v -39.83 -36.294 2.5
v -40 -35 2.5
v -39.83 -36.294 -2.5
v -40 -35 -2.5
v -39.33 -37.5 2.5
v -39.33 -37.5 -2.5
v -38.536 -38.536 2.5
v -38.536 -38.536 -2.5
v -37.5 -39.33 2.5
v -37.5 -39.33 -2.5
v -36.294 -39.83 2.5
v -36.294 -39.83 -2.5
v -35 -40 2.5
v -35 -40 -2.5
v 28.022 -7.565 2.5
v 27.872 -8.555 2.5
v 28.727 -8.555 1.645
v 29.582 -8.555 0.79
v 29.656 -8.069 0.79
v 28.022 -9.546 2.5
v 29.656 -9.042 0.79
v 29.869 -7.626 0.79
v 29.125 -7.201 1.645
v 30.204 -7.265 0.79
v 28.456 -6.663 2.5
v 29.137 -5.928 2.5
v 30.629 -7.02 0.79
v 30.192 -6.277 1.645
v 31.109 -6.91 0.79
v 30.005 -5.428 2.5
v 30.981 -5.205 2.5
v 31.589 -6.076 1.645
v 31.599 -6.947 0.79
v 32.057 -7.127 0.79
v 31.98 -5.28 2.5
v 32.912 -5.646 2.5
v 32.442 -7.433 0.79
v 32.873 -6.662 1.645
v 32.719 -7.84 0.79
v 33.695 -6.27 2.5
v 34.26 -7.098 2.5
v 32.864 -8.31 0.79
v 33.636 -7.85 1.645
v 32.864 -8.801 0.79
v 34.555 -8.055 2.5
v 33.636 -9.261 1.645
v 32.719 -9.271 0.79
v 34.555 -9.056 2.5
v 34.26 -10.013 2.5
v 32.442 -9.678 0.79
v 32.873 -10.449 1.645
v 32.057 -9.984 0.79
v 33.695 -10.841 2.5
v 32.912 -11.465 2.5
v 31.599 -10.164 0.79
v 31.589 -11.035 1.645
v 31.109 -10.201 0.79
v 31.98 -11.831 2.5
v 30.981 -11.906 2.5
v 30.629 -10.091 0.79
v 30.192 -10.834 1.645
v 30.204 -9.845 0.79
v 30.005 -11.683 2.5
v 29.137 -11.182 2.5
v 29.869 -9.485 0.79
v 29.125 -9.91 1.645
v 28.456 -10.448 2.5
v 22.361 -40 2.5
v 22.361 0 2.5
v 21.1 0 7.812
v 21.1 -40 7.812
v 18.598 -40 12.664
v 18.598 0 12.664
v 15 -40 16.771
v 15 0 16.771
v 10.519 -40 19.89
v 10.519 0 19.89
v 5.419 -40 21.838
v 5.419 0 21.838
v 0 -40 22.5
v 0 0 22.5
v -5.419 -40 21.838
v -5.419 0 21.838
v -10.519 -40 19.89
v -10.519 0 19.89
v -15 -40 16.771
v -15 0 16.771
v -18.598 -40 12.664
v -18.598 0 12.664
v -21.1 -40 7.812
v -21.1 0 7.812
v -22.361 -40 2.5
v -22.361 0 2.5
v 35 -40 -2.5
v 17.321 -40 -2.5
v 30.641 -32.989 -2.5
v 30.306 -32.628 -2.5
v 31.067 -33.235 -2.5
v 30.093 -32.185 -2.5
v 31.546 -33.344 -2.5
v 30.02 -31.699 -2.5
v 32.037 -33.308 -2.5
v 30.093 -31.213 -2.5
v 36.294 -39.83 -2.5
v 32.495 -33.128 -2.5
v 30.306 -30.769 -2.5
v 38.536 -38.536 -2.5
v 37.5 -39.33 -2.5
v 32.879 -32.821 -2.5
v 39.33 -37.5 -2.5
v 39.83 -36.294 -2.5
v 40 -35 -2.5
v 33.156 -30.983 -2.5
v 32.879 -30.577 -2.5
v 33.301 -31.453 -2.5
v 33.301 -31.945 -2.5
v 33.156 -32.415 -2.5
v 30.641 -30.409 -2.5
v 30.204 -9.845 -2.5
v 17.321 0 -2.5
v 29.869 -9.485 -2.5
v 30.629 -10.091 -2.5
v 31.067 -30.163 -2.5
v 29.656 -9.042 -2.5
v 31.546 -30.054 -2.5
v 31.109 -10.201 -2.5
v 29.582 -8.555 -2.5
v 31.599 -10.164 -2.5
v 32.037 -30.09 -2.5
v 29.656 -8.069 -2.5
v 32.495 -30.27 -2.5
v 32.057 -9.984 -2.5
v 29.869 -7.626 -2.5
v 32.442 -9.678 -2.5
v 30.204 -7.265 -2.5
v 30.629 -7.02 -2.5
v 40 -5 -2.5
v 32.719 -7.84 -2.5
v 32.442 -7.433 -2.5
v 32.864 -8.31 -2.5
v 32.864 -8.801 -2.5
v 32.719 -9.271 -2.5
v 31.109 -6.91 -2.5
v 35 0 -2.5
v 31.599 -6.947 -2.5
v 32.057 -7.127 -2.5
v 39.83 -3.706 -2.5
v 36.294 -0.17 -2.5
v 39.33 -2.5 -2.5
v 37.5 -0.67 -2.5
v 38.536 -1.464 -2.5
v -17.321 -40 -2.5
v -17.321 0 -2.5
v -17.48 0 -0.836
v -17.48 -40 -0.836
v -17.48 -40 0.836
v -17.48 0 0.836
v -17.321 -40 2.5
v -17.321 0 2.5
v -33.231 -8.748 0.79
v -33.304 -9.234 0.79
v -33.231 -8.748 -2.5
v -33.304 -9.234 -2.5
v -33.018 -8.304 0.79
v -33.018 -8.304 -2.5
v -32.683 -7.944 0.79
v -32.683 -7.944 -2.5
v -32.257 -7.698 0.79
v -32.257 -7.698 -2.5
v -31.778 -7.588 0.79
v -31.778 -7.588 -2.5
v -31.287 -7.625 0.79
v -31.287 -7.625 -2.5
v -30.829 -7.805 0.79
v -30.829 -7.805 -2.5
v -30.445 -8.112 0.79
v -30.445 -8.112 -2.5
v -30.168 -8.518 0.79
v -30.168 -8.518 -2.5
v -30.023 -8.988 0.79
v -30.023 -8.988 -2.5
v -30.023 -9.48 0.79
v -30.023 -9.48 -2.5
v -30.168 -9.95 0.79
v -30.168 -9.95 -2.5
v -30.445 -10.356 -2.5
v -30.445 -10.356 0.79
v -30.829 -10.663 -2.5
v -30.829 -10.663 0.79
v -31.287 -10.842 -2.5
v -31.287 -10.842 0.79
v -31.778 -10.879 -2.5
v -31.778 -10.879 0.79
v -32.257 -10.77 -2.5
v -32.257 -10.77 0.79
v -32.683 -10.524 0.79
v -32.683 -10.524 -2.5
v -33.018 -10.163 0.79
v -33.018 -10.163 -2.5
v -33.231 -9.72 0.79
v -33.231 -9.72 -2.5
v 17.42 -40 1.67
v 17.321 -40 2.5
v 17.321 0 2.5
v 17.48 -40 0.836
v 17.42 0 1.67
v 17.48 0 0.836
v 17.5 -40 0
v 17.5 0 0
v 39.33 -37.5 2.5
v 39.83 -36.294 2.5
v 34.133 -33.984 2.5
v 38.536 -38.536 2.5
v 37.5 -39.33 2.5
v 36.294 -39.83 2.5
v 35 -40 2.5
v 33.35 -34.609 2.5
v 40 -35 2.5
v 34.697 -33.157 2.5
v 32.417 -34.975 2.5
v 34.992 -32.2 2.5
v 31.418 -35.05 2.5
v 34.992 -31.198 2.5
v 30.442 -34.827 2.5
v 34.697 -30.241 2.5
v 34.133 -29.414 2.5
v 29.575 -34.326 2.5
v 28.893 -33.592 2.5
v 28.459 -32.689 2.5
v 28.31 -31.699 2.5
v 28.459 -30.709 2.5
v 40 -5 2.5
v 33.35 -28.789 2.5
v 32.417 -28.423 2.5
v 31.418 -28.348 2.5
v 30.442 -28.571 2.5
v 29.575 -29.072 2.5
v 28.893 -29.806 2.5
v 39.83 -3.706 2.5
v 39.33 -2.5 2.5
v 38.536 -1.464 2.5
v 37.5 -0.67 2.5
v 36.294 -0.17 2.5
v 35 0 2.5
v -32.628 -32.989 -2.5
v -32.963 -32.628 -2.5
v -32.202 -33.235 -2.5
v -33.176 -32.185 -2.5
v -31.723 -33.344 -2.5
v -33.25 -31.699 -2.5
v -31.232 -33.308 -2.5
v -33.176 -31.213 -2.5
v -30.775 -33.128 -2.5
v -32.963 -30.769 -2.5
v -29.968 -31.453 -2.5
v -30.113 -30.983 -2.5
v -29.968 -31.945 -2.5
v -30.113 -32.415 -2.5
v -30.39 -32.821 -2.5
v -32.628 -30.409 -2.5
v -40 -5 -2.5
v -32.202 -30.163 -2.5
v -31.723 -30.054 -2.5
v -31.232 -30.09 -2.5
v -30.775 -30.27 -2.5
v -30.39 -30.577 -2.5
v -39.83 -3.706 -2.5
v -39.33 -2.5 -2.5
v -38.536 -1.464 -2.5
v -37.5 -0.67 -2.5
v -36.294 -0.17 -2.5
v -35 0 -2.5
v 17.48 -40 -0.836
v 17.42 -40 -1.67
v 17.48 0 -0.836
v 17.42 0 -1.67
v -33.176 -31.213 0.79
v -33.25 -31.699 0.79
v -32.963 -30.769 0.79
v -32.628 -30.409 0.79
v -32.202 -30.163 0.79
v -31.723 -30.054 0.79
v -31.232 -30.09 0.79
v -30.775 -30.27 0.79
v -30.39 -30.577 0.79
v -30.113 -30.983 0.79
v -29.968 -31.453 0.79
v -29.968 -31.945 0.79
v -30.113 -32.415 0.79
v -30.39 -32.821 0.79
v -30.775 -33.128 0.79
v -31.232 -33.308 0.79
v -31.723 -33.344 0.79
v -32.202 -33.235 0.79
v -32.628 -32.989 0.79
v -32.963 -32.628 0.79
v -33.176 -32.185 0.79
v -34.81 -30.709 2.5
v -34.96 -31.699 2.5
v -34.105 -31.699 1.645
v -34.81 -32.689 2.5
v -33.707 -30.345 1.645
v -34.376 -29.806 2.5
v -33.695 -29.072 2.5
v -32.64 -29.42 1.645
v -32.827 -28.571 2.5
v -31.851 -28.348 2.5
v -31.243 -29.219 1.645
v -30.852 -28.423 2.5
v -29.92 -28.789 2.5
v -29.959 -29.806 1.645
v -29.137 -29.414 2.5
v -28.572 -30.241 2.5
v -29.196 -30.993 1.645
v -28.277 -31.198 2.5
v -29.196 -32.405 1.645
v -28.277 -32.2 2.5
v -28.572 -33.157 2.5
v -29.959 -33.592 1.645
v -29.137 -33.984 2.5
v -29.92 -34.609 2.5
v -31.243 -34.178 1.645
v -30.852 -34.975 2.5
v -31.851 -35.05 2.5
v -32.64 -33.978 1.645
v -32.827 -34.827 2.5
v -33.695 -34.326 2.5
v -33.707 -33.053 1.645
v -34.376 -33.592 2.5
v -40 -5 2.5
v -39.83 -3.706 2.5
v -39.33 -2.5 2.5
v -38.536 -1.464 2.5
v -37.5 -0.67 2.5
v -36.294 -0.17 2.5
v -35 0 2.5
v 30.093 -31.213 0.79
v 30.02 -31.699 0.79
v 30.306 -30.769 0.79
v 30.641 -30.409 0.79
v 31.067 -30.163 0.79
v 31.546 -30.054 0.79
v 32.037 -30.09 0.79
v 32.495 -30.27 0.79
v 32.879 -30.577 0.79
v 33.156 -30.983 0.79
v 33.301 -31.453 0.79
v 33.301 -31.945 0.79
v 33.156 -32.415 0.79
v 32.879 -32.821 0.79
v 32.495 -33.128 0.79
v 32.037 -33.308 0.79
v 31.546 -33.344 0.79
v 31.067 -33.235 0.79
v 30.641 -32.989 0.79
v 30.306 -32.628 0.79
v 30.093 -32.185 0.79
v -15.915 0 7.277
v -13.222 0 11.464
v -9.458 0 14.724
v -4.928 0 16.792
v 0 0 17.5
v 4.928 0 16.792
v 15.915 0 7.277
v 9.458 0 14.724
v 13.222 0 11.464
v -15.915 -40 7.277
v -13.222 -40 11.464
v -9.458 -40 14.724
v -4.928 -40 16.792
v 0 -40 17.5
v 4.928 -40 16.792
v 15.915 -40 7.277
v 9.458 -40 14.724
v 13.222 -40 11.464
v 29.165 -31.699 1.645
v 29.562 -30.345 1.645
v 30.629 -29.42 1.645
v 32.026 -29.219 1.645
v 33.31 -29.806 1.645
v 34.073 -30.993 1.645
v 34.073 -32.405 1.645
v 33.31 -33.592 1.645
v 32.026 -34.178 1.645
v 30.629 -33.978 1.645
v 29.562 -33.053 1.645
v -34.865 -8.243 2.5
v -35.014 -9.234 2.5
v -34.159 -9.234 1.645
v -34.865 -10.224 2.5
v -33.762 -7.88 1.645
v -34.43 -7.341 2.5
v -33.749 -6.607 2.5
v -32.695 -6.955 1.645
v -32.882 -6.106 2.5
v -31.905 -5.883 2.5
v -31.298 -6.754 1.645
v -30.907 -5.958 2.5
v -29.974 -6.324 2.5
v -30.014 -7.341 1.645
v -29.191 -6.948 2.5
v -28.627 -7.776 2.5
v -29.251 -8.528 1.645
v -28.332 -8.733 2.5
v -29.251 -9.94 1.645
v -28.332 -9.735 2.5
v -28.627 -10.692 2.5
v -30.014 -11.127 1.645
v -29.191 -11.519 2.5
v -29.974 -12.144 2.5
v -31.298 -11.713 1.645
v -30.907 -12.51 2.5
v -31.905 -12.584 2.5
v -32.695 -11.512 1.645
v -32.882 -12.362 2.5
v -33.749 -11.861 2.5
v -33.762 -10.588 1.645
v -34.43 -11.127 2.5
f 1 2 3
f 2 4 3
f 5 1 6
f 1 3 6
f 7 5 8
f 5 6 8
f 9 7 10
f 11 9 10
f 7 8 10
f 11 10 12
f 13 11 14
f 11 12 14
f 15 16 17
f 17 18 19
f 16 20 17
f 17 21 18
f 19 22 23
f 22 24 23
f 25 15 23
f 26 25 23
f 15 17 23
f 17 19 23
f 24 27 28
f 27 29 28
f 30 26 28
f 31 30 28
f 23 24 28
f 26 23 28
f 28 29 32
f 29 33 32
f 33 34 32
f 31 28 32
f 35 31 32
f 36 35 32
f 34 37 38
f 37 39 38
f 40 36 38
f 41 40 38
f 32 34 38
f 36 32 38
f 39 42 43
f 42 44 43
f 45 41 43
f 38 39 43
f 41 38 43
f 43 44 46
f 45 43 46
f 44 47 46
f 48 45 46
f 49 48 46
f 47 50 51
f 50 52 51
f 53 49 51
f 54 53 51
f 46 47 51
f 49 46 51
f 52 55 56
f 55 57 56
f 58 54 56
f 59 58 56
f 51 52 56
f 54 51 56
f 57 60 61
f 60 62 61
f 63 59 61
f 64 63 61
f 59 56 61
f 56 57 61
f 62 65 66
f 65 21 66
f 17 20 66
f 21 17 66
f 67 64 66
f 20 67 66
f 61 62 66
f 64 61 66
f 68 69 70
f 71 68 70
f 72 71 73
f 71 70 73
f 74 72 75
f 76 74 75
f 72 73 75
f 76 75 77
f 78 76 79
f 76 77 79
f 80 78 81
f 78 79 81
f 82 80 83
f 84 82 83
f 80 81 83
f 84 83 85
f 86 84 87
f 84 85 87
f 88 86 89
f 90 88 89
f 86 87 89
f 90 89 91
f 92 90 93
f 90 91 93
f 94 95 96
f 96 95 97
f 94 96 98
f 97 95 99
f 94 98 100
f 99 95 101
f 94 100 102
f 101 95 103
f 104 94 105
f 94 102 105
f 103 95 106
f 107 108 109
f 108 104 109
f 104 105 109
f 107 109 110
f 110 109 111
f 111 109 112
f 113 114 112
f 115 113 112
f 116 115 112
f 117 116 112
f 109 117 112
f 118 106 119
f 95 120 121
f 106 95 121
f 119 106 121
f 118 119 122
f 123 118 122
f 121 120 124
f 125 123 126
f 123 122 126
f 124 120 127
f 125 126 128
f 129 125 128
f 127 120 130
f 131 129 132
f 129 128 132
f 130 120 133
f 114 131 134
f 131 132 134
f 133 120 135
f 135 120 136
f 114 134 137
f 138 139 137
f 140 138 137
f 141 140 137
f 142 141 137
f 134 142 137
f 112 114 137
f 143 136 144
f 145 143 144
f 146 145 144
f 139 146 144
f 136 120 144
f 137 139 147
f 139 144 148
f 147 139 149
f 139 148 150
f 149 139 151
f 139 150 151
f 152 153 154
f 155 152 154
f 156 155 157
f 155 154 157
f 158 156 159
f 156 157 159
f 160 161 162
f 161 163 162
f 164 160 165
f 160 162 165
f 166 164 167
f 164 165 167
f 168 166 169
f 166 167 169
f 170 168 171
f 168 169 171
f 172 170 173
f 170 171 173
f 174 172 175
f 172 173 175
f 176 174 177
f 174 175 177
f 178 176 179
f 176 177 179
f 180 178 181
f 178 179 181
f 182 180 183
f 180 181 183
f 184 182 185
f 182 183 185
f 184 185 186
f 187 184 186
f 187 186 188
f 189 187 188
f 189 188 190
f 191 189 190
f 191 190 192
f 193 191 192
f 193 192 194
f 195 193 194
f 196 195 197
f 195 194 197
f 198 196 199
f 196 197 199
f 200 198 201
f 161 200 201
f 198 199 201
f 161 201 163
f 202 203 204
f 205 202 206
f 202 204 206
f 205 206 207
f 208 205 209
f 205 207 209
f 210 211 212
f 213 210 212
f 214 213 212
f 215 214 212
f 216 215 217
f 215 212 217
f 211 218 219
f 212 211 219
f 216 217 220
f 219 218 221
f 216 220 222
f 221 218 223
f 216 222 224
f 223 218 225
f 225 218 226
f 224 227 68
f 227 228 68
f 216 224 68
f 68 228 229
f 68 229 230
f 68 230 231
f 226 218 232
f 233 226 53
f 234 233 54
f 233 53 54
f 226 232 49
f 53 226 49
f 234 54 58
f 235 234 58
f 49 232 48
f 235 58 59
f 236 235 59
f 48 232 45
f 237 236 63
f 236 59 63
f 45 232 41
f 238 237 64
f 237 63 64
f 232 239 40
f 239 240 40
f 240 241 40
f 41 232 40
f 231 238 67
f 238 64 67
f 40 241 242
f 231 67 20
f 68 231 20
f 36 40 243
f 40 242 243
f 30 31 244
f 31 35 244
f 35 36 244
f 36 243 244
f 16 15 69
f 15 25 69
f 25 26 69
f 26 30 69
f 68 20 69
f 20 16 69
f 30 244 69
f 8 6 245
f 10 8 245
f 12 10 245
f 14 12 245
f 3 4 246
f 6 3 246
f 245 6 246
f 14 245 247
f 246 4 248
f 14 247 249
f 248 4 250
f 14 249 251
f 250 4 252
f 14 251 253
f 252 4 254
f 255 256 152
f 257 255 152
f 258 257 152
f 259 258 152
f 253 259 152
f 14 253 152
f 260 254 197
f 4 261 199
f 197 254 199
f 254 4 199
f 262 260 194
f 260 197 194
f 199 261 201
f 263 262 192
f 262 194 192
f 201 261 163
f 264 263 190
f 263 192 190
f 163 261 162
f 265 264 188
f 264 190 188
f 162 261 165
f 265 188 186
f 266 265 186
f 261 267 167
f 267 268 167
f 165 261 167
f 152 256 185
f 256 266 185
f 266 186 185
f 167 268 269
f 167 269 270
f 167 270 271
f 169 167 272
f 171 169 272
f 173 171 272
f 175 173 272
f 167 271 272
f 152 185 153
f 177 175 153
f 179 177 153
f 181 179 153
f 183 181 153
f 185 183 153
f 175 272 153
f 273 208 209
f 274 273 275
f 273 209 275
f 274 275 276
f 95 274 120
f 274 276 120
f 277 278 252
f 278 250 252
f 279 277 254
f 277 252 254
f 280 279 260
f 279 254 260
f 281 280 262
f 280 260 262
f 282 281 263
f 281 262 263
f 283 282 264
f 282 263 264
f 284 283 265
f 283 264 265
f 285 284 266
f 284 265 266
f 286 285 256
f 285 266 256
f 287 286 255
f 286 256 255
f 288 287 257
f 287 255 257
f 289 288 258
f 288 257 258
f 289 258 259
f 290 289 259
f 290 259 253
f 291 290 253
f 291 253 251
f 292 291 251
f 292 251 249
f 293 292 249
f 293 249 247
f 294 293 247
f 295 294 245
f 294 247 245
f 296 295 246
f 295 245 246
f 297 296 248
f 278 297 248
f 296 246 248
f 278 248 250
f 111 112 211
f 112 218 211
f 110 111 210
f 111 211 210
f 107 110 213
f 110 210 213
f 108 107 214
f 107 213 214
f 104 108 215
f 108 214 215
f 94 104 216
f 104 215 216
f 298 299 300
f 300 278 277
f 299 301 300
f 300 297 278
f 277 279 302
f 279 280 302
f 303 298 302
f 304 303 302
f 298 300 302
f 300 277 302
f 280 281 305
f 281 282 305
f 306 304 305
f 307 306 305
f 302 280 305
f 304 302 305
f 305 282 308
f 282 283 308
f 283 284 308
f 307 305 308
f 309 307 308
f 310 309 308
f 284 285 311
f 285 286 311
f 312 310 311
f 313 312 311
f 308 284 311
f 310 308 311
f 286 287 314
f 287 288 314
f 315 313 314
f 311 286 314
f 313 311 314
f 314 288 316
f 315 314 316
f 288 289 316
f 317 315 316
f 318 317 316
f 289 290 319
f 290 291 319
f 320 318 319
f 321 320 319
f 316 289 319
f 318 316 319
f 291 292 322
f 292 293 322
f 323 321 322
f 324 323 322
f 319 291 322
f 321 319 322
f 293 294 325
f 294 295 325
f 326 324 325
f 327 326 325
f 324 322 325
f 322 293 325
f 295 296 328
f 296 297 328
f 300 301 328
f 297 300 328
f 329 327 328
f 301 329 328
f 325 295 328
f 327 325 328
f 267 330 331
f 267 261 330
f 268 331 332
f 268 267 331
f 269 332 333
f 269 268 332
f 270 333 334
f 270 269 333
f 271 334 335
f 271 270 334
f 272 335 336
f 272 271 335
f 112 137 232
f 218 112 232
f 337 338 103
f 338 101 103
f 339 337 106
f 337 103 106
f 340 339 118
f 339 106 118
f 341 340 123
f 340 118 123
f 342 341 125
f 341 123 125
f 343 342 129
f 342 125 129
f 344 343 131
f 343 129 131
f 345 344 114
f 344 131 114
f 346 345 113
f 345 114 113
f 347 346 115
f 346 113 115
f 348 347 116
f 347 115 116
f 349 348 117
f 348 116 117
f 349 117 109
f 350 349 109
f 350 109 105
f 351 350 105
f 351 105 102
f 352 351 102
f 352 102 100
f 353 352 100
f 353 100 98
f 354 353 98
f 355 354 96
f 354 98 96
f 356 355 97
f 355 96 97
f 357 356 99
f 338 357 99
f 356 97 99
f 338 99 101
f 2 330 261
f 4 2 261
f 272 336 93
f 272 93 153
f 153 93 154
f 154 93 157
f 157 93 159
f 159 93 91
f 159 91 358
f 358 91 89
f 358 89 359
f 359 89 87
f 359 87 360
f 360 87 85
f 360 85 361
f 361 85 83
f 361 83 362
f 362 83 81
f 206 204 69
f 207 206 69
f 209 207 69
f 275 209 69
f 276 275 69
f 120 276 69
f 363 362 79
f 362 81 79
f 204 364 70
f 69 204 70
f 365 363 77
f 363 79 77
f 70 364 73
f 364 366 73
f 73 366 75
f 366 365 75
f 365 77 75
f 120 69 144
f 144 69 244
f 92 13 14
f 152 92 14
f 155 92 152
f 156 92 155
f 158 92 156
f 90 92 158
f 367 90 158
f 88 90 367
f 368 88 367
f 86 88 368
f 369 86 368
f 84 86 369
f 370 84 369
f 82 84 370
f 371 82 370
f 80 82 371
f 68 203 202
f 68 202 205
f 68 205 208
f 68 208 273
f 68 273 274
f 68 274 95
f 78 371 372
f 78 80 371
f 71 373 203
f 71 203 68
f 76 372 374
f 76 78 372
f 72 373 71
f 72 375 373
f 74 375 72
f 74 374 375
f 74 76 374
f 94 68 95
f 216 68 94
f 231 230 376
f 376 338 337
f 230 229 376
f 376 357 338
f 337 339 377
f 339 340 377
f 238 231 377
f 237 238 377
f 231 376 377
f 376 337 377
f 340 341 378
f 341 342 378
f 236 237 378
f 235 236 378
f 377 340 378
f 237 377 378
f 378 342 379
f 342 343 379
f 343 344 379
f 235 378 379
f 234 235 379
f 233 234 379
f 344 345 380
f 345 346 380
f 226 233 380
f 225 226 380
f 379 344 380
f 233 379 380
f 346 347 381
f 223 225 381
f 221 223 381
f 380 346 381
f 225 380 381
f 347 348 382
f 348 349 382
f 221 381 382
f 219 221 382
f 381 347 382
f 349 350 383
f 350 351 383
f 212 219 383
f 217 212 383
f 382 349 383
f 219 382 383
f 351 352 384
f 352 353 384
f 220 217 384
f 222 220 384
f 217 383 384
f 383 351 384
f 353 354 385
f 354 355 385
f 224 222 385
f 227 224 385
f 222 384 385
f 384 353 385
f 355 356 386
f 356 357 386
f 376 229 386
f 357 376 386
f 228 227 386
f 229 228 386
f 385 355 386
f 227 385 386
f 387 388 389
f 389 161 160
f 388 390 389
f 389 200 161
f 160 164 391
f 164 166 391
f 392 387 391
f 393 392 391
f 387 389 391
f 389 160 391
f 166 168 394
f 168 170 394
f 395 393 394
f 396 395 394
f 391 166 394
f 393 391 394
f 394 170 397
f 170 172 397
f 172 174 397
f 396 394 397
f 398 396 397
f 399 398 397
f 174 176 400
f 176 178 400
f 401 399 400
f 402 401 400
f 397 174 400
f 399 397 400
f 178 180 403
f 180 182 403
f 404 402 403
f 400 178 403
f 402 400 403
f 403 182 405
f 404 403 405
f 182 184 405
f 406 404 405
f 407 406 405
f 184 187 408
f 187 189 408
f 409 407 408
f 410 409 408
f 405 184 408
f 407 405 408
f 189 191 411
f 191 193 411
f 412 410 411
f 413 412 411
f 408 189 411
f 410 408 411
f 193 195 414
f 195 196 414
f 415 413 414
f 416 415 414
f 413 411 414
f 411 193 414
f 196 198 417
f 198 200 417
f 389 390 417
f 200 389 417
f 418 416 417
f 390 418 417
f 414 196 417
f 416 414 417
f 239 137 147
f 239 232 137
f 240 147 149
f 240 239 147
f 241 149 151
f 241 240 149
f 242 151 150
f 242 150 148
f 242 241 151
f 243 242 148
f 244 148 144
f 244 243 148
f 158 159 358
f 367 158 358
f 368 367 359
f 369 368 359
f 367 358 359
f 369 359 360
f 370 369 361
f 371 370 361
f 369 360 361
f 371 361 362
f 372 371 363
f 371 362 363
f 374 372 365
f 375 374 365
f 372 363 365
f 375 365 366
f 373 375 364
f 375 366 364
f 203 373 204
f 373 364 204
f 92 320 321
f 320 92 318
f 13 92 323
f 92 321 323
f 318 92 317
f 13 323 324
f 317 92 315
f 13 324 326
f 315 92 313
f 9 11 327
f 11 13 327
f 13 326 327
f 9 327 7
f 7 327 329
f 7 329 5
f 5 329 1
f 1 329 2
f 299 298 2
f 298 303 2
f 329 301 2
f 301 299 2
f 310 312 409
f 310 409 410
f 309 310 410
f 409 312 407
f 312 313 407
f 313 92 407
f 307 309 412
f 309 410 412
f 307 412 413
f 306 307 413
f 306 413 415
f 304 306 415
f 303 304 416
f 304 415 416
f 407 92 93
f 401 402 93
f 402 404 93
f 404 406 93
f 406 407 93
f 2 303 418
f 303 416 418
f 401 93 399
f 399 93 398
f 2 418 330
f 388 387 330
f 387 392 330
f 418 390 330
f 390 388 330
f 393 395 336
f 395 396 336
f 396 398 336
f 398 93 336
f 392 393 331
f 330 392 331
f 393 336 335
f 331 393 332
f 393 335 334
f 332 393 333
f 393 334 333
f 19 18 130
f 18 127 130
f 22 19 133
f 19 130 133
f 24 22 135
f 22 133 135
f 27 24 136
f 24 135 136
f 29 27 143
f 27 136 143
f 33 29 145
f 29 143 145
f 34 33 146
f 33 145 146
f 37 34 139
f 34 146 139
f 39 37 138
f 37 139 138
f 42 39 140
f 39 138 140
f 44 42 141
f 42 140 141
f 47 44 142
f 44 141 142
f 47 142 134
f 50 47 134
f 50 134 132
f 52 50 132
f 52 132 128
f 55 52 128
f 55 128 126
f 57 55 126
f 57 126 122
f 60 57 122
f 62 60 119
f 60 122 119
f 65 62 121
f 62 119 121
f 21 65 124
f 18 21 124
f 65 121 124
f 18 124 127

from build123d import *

# Parameters (mm, degrees)
F1_DEPTH       = 40
F2_R           = 5
F4_D           = 3.3
F4_DEPTH       = 13.5
F4_CSINK_D     = 6.72
F4_CSINK_ANGLE = 90
F4_TIP         = 0.9914200214


with BuildPart() as f1:
    # F0 (on Front) → F1 (new body)
    with BuildSketch(Plane.XZ):
        with BuildLine():
            Line((-40, -2.5), (-22.360679775, -2.5))
            ThreePointArc((-22.360679775, -2.5), (-22.5, 0), (-22.360679775, 2.5))
            Line((-22.360679775, 2.5), (-40, 2.5))
            Line((-40, 2.5), (-40, -2.5))
        make_face()
        with BuildLine():
            ThreePointArc((-22.360679775, 2.5), (-22.5, 0), (-22.360679775, -2.5))
            Line((-22.360679775, -2.5), (-17.3205080757, -2.5))
            ThreePointArc((-17.3205080757, -2.5), (-17.5, 0), (-17.3205080757, 2.5))
            Line((-17.3205080757, 2.5), (-22.360679775, 2.5))
        make_face()
        with BuildLine():
            Line((17.3205080757, 2.5), (22.360679775, 2.5))
            ThreePointArc((22.360679775, 2.5), (0, 22.5), (-22.360679775, 2.5))
            Line((-22.360679775, 2.5), (-17.3205080757, 2.5))
            ThreePointArc((-17.3205080757, 2.5), (0, 17.5), (17.3205080757, 2.5))
        make_face()
        with BuildLine():
            Line((17.3205080757, -2.5), (22.360679775, -2.5))
            ThreePointArc((22.360679775, -2.5), (22.4651429434, -1.2519395078), (22.5, 0))
            ThreePointArc((22.5, 0), (22.4651429434, 1.2519395078), (22.360679775, 2.5))
            Line((22.360679775, 2.5), (17.3205080757, 2.5))
            ThreePointArc((17.3205080757, 2.5), (17.4550693399, 1.2532175939), (17.5, 0))
            ThreePointArc((17.5, 0), (17.4550693399, -1.2532175939), (17.3205080757, -2.5))
        make_face()
        with BuildLine():
            Line((22.360679775, -2.5), (40, -2.5))
            Line((40, -2.5), (40, 2.5))
            Line((40, 2.5), (22.360679775, 2.5))
            ThreePointArc((22.360679775, 2.5), (22.4651429434, 1.2519395078), (22.5, 0))
            ThreePointArc((22.5, 0), (22.4651429434, -1.2519395078), (22.360679775, -2.5))
        make_face()
    extrude(amount=F1_DEPTH)

    # F2
    f2_edges = [f1.edges().sort_by_distance(p)[0] for p in [
        (-40, -40, 0),
        (-40, 0, 0),
        (40, -40, 0),
        (40, 0, 0),
    ]]
    fillet(f2_edges, radius=F2_R)

    # F4
    with Locations(Plane.XY.offset(2.5)):
        with Locations((-31.6543355584, -9.2338668182), (-31.5996408463, -31.6989757121), (31.2322638929, -8.5554420948), (31.6695906222, -31.6989757121)):
            CounterSinkHole(F4_D / 2, F4_CSINK_D / 2, depth=F4_DEPTH, counter_sink_angle=F4_CSINK_ANGLE)
            with Locations((0, 0, -(F4_DEPTH + F4_TIP / 2))):  # 118° drill point
                Cone(0, F4_D / 2, F4_TIP, mode=Mode.SUBTRACT)


solid = f1.part
